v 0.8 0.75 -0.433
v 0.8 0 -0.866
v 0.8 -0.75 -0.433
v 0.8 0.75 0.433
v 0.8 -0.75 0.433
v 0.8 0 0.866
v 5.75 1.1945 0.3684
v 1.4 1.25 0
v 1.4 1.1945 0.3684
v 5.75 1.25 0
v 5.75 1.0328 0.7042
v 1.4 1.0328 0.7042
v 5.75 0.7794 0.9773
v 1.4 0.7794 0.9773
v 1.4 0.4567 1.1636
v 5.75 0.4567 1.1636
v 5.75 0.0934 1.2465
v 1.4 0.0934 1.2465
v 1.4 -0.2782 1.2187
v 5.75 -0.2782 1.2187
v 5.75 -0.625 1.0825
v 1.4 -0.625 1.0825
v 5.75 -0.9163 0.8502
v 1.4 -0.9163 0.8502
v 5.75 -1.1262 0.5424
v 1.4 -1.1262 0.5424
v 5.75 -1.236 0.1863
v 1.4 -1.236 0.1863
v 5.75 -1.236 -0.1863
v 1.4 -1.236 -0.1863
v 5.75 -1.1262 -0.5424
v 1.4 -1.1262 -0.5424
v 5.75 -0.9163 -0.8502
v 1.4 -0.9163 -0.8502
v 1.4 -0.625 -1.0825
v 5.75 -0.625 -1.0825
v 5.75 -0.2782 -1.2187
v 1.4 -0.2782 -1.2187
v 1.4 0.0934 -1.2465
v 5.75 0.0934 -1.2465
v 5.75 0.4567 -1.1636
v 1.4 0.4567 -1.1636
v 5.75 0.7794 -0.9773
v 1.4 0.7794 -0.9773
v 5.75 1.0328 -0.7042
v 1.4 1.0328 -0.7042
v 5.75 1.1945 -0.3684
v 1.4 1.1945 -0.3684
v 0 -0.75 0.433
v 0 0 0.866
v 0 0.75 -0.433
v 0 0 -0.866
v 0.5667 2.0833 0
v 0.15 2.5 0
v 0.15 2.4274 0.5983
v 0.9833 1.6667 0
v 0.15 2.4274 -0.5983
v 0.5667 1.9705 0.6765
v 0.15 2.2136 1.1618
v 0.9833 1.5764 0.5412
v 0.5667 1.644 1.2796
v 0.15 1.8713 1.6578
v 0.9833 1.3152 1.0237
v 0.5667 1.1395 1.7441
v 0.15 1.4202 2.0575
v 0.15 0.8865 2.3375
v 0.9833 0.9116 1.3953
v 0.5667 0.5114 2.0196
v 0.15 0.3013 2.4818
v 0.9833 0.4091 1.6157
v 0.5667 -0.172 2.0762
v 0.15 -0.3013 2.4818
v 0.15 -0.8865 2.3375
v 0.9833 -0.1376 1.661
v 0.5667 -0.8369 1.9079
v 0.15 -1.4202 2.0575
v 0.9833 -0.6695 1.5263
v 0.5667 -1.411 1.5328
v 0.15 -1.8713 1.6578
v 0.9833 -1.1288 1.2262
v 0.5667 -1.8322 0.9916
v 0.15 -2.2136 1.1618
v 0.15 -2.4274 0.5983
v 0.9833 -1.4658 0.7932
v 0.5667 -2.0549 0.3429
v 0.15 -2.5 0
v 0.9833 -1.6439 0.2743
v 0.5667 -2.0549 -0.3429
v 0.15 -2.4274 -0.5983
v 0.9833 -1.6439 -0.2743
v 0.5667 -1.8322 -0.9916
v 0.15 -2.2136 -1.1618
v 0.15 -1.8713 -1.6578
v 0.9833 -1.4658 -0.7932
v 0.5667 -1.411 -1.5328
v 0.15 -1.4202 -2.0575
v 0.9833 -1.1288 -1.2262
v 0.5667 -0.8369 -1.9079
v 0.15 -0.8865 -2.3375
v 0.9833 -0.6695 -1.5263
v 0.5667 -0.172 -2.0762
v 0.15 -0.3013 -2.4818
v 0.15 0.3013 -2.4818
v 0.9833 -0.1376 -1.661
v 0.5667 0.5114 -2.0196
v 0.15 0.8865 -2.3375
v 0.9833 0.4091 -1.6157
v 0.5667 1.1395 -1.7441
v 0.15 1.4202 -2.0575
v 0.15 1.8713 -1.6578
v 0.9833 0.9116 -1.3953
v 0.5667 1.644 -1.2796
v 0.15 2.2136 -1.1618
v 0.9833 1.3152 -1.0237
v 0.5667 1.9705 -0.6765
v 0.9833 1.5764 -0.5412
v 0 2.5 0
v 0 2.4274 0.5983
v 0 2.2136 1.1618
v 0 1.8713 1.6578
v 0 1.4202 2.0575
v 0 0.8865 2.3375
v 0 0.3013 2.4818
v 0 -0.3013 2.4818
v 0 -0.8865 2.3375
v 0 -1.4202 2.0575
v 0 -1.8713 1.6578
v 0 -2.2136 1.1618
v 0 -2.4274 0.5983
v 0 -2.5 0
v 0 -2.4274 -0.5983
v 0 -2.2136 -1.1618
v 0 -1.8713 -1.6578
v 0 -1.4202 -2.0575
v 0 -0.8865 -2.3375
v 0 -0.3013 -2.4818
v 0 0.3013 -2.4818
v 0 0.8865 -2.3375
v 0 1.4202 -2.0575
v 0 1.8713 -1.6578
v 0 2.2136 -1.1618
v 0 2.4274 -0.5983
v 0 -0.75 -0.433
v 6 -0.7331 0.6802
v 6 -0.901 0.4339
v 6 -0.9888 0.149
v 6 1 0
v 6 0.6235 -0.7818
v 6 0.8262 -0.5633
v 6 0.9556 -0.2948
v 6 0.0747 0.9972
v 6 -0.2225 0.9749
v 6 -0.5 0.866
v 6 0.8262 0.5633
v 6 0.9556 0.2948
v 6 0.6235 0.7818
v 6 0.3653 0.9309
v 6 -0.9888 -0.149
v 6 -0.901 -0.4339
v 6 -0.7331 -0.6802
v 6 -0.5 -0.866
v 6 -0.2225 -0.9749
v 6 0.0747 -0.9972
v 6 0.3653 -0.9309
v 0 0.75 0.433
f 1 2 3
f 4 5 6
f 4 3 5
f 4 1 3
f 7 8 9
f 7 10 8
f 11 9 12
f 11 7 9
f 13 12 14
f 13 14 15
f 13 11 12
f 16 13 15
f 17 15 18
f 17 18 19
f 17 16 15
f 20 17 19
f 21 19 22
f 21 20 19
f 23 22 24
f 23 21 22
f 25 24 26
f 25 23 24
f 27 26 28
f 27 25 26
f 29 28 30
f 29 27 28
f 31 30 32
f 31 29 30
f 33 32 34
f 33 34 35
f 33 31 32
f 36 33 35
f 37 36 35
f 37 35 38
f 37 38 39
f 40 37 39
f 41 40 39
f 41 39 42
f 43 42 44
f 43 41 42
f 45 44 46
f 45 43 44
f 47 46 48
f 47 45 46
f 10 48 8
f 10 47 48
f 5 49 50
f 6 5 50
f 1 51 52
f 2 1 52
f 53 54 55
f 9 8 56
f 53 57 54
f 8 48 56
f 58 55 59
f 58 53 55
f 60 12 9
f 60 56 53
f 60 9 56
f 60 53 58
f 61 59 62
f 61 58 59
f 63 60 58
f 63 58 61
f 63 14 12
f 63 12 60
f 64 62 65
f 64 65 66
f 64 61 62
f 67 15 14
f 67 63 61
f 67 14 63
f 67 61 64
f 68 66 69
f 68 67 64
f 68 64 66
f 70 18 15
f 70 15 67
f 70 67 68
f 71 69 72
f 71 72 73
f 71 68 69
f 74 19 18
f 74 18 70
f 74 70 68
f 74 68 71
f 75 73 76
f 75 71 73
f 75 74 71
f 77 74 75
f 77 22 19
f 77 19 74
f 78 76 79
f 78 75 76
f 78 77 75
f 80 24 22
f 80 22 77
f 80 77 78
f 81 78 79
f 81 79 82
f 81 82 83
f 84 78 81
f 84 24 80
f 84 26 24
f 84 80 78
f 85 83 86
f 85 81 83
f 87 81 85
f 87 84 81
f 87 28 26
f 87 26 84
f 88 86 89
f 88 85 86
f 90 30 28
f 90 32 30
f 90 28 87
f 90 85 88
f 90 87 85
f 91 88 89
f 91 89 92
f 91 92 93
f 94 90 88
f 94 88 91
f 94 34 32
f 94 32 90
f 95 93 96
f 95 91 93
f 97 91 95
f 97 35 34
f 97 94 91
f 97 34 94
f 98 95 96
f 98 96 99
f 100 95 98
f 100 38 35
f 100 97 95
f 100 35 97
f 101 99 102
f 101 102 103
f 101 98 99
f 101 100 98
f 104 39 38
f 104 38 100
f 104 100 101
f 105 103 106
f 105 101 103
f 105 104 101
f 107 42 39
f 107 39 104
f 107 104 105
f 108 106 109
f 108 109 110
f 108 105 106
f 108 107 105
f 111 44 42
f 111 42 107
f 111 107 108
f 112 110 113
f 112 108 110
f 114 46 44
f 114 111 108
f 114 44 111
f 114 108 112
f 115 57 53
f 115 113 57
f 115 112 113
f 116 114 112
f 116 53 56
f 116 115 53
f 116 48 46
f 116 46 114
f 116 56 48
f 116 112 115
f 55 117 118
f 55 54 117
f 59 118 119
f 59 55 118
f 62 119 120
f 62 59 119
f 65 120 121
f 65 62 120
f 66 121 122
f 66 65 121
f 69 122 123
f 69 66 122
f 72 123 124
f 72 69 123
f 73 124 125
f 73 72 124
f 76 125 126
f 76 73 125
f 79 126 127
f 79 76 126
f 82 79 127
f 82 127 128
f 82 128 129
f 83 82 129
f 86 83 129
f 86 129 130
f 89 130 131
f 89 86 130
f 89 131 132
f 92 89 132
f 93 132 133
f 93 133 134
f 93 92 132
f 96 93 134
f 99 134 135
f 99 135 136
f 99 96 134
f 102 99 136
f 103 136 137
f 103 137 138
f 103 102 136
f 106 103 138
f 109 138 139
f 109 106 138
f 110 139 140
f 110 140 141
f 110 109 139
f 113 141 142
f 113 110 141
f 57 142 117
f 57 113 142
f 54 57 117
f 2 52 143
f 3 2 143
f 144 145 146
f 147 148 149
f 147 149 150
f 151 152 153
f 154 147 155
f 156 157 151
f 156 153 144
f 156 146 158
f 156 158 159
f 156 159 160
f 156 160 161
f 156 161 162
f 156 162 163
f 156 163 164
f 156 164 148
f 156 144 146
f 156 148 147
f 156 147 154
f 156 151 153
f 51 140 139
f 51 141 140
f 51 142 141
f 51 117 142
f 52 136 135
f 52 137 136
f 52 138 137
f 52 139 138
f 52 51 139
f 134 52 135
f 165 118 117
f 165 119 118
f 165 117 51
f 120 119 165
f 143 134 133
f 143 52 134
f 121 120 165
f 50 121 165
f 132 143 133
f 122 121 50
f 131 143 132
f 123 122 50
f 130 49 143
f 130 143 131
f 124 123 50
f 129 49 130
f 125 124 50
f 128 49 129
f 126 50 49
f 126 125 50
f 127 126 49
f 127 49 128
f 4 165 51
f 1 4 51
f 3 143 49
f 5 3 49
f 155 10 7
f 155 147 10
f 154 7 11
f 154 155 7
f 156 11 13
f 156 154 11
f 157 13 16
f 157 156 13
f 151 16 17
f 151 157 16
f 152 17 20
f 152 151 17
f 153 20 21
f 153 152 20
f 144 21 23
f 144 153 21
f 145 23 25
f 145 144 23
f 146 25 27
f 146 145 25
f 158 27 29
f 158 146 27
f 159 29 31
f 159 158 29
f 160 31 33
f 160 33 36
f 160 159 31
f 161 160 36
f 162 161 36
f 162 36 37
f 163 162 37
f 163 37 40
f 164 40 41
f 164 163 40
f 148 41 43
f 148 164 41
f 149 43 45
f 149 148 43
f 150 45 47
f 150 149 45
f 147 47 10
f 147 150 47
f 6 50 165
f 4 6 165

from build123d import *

# Parameters (mm, degrees)
CUT_EXTRUDE1_DEPTH = 0.8


with BuildPart() as part:
    # Sketch2 → Revolve1 (revolve)
    with BuildSketch(Plane.XY):
        Polygon((0, 0), (0, 2.5), (0.15, 2.5), (1.4, 1.25), (5.75, 1.25), (6, 1), (6, 0), align=None)
    revolve(axis=Axis((-2.281841559, 0, 0), (1, 0, 0)))

    # Sketch3 → Cut-Extrude1 (cut)
    with BuildSketch(Plane.ZY):
        Polygon((0.433012702, -0.75), (0.866025404, 0), (0.433012702, 0.75), (-0.433012702, 0.75), (-0.866025404, 0), (-0.433012702, -0.75), align=None)
    extrude(amount=-CUT_EXTRUDE1_DEPTH, mode=Mode.SUBTRACT)


solid = part.part
